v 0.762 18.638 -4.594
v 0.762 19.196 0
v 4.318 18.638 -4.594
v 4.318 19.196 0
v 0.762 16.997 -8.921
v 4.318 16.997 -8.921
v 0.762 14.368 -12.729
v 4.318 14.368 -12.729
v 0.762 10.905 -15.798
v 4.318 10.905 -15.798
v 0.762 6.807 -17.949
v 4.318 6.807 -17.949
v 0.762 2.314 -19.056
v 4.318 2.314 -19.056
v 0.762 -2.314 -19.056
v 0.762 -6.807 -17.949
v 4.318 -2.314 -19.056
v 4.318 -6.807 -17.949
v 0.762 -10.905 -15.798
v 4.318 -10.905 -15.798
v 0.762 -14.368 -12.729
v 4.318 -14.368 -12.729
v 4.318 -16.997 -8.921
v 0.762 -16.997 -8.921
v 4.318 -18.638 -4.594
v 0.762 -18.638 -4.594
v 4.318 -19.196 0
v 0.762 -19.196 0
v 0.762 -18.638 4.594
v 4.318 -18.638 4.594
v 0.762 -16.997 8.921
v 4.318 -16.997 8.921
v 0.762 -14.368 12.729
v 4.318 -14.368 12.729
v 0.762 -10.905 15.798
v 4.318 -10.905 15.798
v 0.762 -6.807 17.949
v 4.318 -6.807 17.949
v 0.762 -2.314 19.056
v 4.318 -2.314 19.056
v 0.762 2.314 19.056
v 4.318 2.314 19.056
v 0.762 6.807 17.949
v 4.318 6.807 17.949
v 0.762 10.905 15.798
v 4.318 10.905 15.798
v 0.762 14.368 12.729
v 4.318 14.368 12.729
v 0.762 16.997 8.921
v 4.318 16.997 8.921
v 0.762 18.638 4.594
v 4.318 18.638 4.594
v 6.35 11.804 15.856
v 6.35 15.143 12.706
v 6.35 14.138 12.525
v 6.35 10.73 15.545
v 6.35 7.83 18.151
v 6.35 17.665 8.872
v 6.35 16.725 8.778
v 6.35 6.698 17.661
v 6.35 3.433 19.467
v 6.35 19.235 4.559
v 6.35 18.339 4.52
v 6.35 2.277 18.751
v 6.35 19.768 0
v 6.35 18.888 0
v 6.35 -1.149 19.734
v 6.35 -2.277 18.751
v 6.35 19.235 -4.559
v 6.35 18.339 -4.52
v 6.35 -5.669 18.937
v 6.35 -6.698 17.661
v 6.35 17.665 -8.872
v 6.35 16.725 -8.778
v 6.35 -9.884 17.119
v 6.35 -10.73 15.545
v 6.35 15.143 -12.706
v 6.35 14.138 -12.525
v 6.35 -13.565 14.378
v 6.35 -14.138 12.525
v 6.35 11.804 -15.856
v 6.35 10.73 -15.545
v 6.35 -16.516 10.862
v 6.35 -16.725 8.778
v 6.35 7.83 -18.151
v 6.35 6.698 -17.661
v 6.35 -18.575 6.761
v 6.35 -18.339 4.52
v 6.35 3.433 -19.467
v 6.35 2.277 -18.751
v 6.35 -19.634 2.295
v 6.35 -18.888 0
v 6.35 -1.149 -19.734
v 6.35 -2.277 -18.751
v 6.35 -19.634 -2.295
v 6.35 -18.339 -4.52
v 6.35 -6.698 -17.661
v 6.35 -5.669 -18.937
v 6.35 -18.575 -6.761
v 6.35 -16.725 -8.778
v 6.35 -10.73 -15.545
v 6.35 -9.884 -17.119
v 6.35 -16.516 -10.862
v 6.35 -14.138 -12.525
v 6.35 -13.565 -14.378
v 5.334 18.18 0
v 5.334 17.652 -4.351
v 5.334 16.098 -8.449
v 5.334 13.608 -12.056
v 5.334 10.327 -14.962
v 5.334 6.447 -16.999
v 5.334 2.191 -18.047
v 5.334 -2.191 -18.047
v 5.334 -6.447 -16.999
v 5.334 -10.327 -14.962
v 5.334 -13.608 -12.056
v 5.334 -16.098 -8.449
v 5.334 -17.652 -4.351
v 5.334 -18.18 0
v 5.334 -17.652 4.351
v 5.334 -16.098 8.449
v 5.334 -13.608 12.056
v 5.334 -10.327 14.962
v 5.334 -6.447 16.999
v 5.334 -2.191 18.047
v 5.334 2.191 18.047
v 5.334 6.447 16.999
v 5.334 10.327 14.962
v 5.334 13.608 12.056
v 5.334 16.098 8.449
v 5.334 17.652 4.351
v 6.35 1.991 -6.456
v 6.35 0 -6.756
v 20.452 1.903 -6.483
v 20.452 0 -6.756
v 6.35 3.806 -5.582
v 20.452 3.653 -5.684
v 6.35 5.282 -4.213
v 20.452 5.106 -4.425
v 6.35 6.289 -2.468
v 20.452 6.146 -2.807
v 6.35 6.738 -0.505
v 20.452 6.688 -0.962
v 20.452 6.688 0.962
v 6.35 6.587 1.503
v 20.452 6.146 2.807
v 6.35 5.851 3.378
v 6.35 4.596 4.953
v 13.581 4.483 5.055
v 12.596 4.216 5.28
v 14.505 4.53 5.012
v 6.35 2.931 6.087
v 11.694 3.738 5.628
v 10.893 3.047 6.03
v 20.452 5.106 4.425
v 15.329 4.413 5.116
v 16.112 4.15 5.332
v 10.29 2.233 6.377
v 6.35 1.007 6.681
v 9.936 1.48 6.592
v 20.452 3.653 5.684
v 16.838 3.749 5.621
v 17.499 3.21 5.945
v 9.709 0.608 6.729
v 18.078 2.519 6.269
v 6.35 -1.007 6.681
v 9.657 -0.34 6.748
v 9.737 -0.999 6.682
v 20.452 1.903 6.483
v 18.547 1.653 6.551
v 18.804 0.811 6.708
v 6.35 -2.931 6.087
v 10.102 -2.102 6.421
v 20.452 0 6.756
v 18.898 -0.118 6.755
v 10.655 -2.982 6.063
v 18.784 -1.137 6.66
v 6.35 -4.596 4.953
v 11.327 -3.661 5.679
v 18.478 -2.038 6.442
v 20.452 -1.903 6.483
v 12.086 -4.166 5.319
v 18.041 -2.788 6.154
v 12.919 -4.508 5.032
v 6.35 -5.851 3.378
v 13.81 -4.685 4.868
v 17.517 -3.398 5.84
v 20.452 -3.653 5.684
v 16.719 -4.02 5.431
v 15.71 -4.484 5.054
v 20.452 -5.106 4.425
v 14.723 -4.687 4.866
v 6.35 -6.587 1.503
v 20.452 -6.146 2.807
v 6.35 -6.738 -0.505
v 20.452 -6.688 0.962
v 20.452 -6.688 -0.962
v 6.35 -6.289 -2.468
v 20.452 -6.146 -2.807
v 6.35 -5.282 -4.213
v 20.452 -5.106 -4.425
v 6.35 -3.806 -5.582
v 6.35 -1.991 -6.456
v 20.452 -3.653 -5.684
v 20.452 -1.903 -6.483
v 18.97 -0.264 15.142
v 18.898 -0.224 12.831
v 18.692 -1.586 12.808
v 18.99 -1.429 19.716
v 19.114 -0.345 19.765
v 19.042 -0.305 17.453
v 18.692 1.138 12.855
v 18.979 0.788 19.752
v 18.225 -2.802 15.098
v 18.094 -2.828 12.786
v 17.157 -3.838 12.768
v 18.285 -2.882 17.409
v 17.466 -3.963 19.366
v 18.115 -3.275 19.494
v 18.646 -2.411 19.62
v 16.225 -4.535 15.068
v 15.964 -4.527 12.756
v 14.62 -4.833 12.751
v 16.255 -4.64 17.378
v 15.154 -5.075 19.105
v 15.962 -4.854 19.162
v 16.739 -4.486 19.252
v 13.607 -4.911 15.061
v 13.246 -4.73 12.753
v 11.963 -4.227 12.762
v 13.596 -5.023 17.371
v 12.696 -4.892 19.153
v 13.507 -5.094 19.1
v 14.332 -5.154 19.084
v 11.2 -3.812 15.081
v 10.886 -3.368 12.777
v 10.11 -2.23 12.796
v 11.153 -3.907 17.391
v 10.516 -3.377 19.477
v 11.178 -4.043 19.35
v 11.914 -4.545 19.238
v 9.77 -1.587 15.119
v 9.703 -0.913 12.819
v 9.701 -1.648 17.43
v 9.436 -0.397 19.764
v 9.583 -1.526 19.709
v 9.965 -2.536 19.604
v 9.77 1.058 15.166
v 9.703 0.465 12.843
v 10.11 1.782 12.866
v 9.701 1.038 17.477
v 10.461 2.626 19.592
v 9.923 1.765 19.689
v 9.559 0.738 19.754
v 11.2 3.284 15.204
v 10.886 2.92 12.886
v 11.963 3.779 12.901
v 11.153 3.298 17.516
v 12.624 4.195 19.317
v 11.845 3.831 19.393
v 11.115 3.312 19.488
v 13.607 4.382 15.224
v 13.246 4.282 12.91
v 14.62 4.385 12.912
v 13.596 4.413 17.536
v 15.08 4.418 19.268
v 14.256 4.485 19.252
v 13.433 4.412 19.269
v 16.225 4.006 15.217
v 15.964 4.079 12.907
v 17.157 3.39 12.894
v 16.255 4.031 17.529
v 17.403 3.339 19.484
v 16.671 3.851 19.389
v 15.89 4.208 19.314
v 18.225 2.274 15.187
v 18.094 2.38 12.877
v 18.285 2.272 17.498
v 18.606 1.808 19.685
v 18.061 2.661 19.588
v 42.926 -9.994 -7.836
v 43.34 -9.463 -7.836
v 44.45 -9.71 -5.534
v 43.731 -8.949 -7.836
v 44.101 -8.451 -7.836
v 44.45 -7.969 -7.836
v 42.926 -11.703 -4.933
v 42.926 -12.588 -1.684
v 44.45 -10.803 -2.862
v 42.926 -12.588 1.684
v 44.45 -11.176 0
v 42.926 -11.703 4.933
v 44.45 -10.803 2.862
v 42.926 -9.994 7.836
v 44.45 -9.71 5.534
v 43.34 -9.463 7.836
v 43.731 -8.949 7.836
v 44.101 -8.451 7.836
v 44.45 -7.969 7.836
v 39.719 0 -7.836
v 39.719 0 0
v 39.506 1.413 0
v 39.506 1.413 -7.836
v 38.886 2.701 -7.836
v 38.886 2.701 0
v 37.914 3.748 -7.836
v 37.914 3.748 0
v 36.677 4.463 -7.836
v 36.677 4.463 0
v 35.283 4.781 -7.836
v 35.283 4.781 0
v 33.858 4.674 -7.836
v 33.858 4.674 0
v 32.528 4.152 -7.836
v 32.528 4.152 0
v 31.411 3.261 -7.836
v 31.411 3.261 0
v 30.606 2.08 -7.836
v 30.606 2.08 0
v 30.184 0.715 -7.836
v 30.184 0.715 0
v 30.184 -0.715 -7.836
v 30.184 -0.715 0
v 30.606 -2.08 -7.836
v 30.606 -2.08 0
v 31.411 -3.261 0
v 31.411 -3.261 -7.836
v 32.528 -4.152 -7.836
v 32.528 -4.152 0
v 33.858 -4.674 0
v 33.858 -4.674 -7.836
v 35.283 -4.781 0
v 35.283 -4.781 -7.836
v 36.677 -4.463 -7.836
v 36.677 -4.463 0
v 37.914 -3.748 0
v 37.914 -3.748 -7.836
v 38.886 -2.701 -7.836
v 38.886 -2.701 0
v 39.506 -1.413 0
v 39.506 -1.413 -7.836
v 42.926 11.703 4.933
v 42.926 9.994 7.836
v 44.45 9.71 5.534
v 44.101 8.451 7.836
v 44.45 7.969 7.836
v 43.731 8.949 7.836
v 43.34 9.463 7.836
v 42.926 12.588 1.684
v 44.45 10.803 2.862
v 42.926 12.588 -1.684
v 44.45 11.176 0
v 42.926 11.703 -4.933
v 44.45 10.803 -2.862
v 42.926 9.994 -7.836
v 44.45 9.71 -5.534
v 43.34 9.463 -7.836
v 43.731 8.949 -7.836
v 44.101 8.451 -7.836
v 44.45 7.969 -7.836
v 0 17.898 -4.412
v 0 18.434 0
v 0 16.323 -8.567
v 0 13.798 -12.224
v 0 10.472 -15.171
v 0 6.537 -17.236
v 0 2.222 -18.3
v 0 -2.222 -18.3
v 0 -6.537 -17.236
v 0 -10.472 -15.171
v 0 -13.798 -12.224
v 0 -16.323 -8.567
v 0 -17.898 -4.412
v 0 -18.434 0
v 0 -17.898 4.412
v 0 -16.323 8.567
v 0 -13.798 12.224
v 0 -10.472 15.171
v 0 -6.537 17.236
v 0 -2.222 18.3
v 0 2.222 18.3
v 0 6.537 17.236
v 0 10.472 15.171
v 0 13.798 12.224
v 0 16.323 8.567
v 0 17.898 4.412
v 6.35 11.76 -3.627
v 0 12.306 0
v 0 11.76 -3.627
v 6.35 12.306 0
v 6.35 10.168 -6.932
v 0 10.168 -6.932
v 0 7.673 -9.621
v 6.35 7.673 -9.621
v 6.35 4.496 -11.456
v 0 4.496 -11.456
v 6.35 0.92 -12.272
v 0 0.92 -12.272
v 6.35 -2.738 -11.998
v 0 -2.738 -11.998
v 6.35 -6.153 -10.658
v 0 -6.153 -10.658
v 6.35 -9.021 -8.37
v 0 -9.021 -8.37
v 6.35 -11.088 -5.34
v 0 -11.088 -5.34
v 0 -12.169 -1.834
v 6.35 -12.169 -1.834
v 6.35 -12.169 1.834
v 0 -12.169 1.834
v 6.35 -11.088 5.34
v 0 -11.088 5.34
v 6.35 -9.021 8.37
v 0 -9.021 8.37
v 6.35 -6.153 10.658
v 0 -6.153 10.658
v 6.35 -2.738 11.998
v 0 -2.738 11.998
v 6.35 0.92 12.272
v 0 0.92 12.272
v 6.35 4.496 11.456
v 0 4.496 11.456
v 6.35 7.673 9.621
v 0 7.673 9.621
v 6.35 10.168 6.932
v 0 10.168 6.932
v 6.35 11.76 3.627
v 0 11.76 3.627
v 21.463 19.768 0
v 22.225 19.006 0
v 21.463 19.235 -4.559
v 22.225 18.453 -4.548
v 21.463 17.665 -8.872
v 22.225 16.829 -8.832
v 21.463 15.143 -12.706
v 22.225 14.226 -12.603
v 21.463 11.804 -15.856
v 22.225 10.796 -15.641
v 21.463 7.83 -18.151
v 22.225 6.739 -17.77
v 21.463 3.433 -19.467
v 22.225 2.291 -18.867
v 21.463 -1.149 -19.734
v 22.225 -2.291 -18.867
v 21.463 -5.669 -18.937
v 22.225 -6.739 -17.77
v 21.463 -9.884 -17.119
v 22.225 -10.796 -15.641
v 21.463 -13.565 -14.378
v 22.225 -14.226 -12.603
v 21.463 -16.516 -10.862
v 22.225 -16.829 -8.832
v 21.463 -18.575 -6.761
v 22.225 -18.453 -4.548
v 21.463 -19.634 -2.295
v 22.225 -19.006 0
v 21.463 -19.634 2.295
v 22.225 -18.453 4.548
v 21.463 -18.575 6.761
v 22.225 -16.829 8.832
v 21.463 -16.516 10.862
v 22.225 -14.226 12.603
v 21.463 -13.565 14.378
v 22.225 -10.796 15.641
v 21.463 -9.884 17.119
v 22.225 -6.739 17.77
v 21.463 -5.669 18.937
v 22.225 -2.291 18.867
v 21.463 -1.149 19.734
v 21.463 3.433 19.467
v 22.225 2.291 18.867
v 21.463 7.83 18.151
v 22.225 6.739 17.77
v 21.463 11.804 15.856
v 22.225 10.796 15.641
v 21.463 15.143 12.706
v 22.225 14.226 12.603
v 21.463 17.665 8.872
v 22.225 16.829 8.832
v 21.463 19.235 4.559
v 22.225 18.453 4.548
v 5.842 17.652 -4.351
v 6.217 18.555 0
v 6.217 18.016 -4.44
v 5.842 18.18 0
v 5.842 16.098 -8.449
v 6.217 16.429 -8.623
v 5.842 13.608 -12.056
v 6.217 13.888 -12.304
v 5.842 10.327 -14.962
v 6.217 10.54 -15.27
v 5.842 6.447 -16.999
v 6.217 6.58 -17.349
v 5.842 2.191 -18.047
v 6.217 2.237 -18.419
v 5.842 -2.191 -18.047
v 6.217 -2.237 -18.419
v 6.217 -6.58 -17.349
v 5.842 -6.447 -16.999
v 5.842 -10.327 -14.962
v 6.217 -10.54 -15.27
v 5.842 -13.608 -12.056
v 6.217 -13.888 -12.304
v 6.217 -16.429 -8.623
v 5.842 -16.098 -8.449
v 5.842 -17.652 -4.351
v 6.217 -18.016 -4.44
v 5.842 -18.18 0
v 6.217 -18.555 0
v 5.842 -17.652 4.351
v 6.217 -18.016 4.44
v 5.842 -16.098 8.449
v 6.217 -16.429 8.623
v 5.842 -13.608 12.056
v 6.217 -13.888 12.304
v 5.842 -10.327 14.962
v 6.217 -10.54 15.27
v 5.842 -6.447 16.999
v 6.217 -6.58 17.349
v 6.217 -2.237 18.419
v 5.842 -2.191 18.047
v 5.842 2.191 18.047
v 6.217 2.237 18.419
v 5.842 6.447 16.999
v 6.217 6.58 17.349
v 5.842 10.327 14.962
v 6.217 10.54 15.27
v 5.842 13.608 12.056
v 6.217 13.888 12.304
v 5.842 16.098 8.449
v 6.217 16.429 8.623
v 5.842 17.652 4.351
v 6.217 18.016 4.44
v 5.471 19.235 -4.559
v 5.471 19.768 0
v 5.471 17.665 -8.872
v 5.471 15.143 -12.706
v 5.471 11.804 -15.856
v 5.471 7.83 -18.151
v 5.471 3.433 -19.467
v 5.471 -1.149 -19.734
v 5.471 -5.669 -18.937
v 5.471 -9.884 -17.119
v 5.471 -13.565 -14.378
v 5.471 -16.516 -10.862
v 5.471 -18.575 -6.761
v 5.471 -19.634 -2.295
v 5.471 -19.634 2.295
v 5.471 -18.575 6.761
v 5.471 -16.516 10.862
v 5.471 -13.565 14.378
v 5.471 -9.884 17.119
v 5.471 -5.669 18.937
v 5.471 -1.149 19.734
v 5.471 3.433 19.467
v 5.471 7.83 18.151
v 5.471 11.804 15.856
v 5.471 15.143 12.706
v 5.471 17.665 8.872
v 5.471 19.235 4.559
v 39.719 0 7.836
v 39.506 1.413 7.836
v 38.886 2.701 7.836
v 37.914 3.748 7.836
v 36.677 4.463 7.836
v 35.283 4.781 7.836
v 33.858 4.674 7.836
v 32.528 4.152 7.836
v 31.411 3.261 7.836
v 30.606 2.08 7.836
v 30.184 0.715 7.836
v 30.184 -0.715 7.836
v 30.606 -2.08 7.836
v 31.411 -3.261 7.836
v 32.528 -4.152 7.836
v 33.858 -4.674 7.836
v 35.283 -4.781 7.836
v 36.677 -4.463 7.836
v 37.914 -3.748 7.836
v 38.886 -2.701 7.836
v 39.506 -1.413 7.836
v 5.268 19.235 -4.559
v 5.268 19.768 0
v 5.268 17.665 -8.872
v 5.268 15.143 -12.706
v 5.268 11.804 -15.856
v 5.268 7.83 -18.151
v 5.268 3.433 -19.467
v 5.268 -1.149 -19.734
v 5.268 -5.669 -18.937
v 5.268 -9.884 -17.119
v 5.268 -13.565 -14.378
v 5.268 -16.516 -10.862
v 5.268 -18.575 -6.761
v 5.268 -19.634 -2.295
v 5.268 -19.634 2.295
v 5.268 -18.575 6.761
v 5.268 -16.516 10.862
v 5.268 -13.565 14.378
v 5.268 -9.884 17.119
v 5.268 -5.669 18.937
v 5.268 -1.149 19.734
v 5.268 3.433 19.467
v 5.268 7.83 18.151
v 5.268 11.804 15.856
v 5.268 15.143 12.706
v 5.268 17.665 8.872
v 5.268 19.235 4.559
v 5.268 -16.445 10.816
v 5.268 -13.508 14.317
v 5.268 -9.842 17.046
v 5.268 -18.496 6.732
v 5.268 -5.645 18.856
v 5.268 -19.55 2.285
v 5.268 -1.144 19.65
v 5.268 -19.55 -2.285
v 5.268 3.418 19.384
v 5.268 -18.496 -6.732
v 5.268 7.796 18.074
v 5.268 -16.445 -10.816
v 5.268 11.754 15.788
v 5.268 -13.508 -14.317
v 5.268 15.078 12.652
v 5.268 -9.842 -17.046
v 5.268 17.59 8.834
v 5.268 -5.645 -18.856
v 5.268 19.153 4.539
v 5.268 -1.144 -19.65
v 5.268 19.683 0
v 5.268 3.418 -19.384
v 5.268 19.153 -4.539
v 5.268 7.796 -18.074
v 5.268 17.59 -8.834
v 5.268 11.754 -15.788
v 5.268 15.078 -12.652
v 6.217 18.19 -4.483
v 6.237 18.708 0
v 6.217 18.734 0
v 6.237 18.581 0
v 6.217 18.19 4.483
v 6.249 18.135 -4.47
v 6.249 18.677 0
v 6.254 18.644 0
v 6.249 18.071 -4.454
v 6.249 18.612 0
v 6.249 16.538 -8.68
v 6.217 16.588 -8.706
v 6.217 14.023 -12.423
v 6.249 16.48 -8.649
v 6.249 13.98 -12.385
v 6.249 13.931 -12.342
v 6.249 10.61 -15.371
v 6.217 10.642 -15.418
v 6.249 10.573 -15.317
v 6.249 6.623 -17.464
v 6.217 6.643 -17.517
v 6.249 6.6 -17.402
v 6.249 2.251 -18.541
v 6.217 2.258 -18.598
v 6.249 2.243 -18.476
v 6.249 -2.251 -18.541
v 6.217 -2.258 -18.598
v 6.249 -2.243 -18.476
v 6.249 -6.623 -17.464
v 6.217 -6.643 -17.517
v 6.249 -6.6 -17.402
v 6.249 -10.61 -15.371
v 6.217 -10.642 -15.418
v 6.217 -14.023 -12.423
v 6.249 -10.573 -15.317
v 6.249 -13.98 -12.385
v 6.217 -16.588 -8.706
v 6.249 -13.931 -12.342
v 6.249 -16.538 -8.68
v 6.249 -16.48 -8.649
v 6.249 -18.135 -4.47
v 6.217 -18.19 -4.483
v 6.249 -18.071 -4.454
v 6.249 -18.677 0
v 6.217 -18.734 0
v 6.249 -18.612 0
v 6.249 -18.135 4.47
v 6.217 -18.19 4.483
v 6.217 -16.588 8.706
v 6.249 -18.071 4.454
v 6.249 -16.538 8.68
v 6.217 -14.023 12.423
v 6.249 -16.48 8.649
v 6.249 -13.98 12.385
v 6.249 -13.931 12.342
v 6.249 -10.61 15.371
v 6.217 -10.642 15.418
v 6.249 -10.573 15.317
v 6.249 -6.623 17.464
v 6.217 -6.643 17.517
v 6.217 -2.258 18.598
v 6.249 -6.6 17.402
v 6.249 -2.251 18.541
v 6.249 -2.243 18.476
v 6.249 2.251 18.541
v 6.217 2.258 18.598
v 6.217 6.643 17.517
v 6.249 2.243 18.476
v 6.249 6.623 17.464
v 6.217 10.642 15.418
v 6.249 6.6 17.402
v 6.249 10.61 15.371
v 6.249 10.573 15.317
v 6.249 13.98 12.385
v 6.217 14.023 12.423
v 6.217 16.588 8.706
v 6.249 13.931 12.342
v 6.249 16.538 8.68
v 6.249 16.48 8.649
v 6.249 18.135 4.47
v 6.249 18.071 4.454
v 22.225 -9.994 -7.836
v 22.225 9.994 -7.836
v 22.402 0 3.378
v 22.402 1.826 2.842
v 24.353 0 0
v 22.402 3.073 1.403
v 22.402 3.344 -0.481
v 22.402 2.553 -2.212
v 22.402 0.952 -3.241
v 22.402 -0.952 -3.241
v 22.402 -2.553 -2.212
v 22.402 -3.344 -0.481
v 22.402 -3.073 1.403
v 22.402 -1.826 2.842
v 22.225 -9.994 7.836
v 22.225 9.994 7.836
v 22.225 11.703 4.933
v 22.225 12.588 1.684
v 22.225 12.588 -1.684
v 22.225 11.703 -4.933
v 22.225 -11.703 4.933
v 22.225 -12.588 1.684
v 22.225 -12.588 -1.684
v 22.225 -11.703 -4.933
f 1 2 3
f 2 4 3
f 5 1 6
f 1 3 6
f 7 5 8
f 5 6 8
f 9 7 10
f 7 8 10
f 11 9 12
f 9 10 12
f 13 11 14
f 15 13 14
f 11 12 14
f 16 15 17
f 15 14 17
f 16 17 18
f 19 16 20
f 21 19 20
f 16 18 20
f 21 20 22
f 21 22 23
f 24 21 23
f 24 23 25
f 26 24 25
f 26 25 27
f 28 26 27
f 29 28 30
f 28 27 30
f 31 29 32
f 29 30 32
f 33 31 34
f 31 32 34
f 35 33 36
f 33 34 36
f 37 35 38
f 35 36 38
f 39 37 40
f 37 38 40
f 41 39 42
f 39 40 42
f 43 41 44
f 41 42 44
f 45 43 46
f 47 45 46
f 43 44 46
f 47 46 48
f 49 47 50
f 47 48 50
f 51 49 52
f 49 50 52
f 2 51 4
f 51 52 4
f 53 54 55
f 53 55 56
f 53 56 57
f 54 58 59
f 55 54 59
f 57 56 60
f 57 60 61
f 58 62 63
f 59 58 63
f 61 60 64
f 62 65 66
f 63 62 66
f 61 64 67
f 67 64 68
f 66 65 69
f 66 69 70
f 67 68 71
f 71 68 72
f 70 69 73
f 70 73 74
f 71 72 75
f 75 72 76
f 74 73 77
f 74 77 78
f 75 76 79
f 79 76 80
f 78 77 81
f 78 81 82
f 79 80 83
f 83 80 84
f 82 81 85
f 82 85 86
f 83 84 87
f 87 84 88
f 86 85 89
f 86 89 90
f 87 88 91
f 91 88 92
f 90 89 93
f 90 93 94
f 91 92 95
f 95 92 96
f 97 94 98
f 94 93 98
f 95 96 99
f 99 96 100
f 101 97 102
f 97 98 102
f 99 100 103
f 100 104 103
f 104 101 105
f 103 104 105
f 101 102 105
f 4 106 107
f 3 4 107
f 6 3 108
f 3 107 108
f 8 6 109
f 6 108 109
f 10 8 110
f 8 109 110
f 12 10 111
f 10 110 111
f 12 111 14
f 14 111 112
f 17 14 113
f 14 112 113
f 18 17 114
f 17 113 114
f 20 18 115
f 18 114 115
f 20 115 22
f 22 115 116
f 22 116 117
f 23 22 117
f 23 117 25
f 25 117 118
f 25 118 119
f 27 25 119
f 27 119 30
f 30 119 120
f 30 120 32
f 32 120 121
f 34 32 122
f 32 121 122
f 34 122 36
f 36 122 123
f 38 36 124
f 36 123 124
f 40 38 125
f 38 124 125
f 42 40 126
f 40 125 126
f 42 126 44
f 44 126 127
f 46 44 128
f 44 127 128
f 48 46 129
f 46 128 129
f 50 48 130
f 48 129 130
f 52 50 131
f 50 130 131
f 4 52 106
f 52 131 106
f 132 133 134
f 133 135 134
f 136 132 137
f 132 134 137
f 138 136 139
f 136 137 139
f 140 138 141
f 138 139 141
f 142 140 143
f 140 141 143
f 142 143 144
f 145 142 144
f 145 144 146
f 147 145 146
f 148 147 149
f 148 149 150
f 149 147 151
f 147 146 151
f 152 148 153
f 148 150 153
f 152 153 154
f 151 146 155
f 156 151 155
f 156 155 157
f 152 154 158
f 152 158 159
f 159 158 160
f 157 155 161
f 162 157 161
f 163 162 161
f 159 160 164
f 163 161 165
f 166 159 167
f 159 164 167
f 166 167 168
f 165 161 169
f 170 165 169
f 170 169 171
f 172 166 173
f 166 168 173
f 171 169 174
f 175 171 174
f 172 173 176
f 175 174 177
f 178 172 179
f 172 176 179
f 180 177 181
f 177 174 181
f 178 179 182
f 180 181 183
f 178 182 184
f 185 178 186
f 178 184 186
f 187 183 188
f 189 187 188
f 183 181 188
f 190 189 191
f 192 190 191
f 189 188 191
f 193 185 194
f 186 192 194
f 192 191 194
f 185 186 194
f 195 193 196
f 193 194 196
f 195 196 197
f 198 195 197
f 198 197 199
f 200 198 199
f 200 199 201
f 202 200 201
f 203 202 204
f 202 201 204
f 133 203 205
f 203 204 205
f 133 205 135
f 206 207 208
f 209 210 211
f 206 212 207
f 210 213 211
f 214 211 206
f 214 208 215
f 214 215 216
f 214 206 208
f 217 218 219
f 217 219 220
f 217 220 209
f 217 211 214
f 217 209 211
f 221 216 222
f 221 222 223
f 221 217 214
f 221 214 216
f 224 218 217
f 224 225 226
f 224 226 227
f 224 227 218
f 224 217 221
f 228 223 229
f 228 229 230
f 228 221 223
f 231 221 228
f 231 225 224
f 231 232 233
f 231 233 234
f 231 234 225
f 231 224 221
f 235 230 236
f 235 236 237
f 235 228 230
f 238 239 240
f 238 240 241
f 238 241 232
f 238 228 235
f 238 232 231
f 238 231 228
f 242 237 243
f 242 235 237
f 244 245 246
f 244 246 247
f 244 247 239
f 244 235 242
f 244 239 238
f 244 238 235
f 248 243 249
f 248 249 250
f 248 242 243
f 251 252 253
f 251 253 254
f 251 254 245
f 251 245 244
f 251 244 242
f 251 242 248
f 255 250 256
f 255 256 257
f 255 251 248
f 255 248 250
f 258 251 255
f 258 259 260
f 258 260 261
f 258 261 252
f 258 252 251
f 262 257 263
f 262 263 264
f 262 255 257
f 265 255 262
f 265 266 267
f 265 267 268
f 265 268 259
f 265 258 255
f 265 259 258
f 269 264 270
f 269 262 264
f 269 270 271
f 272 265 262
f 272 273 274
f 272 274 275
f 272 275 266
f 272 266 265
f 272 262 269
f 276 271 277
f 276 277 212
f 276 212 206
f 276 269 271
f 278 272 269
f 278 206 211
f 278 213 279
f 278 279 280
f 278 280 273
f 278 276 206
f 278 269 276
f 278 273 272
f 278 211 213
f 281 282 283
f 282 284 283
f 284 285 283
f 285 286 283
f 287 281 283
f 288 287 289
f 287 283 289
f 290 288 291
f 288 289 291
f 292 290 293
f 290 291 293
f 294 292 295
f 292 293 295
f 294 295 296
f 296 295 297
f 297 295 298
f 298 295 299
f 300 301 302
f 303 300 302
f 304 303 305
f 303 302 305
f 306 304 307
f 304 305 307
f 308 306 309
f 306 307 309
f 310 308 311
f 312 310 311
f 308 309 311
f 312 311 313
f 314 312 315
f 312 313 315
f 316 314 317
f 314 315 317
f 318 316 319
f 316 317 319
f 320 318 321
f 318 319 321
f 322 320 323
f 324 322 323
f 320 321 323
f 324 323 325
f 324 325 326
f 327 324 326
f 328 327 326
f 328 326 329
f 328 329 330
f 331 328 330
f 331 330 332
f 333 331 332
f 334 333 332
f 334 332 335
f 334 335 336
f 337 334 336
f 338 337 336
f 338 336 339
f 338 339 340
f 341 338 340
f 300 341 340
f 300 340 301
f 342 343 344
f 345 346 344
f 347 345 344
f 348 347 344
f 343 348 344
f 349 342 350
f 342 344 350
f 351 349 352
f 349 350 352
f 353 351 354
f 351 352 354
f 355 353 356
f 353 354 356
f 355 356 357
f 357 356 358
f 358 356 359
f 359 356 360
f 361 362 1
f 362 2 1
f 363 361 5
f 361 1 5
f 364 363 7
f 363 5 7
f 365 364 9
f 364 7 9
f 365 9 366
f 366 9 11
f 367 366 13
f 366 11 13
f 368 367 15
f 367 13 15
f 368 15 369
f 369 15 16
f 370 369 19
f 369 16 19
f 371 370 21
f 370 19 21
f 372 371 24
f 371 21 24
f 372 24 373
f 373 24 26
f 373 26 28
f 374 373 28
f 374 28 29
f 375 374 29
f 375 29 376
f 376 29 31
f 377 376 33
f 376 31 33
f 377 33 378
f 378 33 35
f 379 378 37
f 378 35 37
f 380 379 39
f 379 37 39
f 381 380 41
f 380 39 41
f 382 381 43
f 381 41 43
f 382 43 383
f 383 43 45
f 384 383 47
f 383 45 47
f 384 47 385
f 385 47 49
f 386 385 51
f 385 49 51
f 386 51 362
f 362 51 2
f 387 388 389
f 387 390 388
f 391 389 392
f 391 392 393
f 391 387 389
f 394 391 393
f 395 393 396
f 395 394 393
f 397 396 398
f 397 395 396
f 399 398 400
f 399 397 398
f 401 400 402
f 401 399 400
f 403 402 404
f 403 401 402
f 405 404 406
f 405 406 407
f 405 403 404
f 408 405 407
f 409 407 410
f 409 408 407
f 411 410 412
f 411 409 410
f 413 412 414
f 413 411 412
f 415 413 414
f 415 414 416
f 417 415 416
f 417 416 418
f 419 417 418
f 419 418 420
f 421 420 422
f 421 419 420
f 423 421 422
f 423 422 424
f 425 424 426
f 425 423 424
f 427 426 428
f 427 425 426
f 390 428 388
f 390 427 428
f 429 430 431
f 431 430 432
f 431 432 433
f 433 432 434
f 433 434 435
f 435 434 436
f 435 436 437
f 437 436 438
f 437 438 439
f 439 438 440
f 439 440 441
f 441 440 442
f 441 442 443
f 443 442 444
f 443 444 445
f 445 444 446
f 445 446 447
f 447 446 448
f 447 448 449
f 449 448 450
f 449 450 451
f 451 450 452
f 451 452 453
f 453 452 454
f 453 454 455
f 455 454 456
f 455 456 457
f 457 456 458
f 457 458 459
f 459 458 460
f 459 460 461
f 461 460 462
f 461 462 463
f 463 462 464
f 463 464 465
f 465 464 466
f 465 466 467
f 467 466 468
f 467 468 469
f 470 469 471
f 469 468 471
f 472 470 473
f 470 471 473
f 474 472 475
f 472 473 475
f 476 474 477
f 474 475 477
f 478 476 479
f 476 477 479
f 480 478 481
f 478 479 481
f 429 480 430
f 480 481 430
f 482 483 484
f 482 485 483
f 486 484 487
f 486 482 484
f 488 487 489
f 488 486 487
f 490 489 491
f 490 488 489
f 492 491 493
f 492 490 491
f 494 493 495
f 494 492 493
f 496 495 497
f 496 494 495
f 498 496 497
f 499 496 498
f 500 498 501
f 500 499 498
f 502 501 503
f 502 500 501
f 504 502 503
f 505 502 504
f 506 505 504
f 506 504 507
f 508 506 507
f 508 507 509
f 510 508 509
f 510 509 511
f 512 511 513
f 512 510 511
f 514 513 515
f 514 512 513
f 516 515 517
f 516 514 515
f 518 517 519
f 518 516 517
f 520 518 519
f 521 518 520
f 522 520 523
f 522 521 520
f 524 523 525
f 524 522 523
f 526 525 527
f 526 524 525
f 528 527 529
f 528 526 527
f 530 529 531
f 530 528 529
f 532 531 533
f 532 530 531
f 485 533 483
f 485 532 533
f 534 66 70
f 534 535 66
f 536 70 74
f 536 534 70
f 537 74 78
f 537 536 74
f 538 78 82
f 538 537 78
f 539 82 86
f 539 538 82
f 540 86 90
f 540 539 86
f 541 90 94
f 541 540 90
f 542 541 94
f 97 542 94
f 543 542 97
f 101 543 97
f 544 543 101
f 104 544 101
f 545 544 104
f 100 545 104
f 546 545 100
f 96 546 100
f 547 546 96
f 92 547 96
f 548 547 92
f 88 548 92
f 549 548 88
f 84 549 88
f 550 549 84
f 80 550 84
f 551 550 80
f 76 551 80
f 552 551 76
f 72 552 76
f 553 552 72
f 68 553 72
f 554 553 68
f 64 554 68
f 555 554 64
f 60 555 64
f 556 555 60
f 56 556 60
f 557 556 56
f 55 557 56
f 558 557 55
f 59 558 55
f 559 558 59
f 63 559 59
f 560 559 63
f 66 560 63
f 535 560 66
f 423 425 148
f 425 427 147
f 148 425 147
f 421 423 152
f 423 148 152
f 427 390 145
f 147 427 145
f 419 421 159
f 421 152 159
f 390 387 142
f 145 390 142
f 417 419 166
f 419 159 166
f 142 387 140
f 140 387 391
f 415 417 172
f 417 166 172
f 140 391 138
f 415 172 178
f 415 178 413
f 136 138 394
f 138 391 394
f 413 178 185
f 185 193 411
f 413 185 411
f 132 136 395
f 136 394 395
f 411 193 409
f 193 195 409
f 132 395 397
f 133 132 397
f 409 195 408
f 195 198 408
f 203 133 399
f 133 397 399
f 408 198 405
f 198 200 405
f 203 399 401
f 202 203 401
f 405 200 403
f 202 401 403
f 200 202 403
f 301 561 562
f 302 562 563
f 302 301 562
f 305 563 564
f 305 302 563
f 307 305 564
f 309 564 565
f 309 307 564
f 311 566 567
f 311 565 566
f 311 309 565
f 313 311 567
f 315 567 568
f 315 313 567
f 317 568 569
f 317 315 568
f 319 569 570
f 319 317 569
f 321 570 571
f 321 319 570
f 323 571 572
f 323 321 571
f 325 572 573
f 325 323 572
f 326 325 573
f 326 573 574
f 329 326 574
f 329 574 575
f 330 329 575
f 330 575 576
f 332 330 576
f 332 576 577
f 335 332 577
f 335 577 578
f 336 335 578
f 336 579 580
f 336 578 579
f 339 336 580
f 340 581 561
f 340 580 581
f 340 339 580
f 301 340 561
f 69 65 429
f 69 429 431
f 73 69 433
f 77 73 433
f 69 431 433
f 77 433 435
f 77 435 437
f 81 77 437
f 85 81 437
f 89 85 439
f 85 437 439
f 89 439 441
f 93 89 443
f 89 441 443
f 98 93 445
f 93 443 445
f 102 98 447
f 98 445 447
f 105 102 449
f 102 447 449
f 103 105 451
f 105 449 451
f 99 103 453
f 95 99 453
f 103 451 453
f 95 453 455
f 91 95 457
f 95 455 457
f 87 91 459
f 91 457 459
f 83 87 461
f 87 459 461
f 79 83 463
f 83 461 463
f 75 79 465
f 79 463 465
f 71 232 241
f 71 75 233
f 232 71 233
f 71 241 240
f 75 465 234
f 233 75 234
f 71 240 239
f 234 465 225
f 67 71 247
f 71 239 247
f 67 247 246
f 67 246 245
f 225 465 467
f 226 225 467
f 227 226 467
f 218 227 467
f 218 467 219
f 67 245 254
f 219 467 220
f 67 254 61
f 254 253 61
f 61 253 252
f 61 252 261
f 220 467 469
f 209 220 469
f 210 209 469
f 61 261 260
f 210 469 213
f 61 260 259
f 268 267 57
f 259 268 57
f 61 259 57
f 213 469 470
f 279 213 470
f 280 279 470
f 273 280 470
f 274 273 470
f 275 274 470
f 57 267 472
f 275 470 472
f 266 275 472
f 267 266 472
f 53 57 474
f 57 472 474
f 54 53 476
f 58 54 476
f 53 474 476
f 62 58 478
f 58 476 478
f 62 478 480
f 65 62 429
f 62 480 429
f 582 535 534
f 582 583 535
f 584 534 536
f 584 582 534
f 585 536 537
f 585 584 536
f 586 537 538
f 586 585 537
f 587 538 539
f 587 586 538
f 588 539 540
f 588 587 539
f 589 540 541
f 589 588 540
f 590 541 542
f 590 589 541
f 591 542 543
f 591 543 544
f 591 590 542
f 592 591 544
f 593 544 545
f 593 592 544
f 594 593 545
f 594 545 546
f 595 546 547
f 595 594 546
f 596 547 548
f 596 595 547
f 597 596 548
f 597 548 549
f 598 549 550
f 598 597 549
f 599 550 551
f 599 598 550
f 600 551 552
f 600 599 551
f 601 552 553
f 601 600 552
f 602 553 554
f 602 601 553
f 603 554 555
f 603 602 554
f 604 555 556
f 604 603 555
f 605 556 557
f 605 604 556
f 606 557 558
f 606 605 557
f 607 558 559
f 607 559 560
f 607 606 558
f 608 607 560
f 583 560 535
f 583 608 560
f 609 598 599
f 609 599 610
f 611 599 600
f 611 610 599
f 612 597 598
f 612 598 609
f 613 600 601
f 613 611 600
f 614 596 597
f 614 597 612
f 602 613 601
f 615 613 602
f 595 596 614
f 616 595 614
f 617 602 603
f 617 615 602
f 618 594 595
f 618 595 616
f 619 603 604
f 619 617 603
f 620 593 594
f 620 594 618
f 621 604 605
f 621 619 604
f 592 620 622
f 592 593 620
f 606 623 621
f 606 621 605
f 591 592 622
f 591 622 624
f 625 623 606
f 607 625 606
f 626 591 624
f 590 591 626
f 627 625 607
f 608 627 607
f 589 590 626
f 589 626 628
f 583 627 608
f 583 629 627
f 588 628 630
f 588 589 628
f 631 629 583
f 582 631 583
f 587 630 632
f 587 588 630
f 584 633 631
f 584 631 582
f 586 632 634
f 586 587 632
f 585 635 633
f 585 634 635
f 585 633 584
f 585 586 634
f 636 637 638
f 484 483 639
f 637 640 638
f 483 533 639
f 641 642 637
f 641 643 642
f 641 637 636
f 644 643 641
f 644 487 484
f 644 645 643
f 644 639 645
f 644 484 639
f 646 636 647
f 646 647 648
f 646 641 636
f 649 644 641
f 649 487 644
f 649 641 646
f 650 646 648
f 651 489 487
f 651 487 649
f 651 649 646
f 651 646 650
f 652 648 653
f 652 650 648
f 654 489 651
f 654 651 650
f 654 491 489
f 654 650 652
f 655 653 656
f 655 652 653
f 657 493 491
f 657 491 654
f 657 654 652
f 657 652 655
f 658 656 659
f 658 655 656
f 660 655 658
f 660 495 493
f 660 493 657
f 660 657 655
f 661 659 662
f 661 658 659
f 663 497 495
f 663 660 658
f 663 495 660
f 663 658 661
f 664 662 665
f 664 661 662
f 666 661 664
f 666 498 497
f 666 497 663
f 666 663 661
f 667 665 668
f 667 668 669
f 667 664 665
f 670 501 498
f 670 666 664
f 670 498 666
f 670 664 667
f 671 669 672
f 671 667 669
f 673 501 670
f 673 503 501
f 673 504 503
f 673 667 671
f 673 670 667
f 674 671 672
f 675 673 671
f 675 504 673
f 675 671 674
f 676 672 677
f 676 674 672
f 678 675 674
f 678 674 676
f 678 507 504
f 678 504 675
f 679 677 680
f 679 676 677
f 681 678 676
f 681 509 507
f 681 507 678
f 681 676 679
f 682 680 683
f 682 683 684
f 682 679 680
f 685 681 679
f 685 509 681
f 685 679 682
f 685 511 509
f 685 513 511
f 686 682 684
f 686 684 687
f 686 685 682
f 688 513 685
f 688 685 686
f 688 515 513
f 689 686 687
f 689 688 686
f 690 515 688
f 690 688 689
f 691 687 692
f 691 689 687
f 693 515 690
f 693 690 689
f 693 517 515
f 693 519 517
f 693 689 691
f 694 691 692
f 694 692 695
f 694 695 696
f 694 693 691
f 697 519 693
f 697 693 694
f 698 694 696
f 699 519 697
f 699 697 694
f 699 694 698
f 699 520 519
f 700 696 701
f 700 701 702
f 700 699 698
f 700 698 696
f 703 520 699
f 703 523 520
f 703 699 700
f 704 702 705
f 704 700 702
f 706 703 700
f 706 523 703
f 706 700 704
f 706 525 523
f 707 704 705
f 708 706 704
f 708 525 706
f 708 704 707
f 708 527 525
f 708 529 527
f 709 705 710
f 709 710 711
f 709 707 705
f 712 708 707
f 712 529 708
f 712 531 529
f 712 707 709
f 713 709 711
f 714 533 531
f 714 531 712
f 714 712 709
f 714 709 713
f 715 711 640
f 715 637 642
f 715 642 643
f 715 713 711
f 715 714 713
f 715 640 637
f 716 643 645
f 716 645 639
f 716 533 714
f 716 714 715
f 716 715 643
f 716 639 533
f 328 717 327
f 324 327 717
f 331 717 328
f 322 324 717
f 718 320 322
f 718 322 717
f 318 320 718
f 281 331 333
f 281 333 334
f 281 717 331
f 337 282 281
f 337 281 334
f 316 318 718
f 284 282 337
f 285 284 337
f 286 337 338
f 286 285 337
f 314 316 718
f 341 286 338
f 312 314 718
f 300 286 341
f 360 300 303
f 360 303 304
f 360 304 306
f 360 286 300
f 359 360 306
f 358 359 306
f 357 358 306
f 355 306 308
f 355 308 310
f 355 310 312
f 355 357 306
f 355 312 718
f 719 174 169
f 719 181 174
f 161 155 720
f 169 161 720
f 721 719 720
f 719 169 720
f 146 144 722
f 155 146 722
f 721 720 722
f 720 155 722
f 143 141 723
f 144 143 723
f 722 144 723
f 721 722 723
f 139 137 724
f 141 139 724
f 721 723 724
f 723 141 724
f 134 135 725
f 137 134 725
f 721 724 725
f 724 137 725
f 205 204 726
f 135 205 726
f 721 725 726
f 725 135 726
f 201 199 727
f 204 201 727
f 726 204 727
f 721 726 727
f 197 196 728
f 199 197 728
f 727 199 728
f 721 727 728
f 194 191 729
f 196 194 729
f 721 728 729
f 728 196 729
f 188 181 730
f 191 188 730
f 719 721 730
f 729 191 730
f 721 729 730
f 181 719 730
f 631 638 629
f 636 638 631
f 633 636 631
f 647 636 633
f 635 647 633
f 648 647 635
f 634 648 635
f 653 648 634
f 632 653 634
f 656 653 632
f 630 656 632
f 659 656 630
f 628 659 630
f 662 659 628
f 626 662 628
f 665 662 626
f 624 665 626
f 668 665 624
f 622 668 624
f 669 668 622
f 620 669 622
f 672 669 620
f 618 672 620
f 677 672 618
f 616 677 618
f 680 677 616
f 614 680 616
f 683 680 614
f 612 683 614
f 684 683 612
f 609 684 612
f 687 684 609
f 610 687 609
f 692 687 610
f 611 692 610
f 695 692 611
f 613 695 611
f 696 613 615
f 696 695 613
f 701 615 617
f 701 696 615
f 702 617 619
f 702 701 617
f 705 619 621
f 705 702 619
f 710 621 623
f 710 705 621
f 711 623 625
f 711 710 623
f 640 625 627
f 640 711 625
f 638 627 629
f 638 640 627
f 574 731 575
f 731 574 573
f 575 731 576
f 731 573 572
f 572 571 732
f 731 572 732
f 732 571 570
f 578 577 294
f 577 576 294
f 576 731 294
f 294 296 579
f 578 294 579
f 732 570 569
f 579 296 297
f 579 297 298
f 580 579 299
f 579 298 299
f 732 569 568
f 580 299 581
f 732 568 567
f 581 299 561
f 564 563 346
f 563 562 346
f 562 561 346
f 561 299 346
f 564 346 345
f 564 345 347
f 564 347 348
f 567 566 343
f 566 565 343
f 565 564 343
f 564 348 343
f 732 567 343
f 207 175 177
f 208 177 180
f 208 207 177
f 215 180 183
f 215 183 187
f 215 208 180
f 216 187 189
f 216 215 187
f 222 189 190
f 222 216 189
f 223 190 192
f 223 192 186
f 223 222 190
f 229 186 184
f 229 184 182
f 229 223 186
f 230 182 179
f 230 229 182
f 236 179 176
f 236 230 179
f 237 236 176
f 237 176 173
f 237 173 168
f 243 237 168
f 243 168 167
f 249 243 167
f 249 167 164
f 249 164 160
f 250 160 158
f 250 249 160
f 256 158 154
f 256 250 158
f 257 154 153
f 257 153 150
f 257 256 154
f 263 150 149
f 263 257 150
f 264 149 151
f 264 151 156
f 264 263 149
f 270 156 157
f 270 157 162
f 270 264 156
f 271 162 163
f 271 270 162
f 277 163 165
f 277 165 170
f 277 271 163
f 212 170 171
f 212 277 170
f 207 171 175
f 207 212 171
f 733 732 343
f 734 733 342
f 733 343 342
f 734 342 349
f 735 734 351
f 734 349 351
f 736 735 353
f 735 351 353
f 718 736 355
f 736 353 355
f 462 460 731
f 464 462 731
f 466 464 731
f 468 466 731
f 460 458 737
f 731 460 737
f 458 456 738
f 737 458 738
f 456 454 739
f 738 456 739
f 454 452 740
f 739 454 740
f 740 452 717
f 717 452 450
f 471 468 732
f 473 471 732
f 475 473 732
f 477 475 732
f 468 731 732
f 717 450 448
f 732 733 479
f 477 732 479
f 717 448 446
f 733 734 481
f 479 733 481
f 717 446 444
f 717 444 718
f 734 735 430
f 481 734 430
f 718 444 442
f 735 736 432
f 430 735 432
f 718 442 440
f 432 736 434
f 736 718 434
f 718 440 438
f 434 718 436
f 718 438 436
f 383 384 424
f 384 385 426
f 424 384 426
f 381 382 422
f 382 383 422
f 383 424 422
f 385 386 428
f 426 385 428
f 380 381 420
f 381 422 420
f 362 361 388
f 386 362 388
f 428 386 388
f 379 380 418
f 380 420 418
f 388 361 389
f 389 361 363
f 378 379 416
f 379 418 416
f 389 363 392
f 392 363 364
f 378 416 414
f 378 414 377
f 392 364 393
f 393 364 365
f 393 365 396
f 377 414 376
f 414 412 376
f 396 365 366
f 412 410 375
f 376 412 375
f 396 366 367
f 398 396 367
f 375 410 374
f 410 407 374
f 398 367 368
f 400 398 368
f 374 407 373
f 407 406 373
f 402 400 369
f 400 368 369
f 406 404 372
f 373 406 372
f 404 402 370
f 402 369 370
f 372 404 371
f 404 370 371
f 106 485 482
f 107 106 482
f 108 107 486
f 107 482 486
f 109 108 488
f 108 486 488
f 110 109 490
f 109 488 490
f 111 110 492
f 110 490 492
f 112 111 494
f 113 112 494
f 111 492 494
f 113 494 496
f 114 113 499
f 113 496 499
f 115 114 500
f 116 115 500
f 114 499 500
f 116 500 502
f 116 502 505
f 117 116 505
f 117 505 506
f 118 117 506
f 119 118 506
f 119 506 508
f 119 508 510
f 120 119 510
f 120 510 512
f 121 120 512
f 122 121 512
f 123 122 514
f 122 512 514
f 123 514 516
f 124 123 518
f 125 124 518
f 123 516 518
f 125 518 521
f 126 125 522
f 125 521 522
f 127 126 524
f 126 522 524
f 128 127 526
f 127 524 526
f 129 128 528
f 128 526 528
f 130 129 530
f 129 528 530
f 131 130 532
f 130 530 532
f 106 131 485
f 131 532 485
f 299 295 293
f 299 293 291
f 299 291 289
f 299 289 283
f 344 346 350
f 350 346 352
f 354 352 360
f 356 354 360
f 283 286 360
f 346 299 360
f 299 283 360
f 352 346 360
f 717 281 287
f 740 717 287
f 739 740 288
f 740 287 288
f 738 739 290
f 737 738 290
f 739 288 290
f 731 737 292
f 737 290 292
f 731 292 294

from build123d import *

# Parameters (mm, degrees)
SKETCH3_W               = 79.0702
SKETCH3_H               = 158.1404
SKETCH3_W_2             = 15.6718
SKETCH3_H_2             = 79.0702
CUT_EXTRUDE1_DEPTH      = 22.225
HOLE1_D                 = 13.5128
HOLE1_DEPTH             = 20.45208
HOLE1_TIP               = 3.900809359
SKETCH7_W               = 6.35
SKETCH7_H               = 12.3063
SKETCH9_R               = 4.79425
CUT_EXTRUDE2_DEPTH      = 11.75385
CUT_EXTRUDE2_DEPTH_BACK = 11.75385


with BuildPart() as part:
    # Sketch1 → Revolve1 (revolve)
    with BuildSketch(Plane.XY):
        Polygon((0, 0), (0, 18.43405), (0.762, 19.19605), (4.318, 19.19605), (5.334, 18.18005), (6.35, 18.18005), (6.35, 19.76755), (21.463, 19.76755), (22.225, 19.00555), (22.225, 0), align=None)
    revolve(axis=Axis((22.225, 0, 0), (-1, 0, 0)))

    # Sketch2 → Revolve2 (revolve)
    with BuildSketch(Plane.XY):
        Polygon((22.225, 0), (22.225, 12.7), (42.926, 12.7), (44.45, 11.176), (44.45, 0), align=None)
    revolve(axis=Axis((44.45, 0, 0), (-1, 0, 0)))

    # Sketch3 → Cut-Extrude1 (cut)
    with BuildSketch(Plane(origin=(44.45, 0, 0), x_dir=(0, 0, -1), z_dir=(1, 0, 0))):
        Rectangle(SKETCH3_W, SKETCH3_H)
        Rectangle(SKETCH3_W_2, SKETCH3_H_2, mode=Mode.SUBTRACT)
    extrude(amount=-CUT_EXTRUDE1_DEPTH, mode=Mode.SUBTRACT)

    # Hole1
    with Locations(Plane.ZY):
        with Locations((0, 0)):
            Hole(HOLE1_D / 2, depth=HOLE1_DEPTH)
            with Locations((0, 0, -(HOLE1_DEPTH + HOLE1_TIP / 2))):  # 120° drill point
                Cone(0, HOLE1_D / 2, HOLE1_TIP, mode=Mode.SUBTRACT)

    # Sketch6 → Cut-Revolve1 (revolve, cut)
    with BuildSketch(Plane(origin=(0, 0, 0), x_dir=(-1, 0, 0), z_dir=(0, 0.999847695, 0.017452406))):
        Polygon((-14.2748, 0), (-18.897793378, 0), (-18.897793378, 12.83335), (-19.114275925, 19.76755), (-14.2748, 19.76755), align=None)
    revolve(axis=Axis((14.2748, -0.344991317, 19.764539306), (0, 0.017452406, -0.999847695)), mode=Mode.SUBTRACT)

    # Sketch7 → Cut-Revolve2 (revolve, cut)
    with BuildSketch(Plane.XY):
        with Locations((3.175, 6.15315)):
            Rectangle(SKETCH7_W, SKETCH7_H)
    revolve(axis=Axis((6.35, 0, 0), (-1, 0, 0)), mode=Mode.SUBTRACT)

    # Sketch8 → Revolve3 (revolve)
    with BuildSketch(Plane.XY):
        with BuildLine():
            Line((5.267509175, 19.683381804), (6.216617928, 18.734273051))
            ThreePointArc((6.216617928, 18.734273051), (6.253815367, 18.64447049), (6.216617928, 18.554667928))
            Line((6.216617928, 18.554667928), (5.842, 18.18005))
            Line((5.842, 18.18005), (5.334, 18.18005))
            Line((5.334, 18.18005), (5.334, 17.92605))
            Line((5.334, 17.92605), (6.35, 17.92605))
            Line((6.35, 17.92605), (6.35, 18.888259175))
            Line((6.35, 18.888259175), (5.470709175, 19.76755))
            Line((5.470709175, 19.76755), (5.267509175, 19.76755))
            Line((5.267509175, 19.76755), (5.267509175, 19.683381804))
        make_face()
    revolve(axis=Axis((6.35, 0, 0), (-1, 0, 0)))

    # Sketch9 → Cut-Extrude2 (cut, two sides)
    with BuildSketch(Plane.XY) as cut_extrude2_sk:
        with Locations((34.925, 0)):
            Circle(SKETCH9_R)
    extrude(amount=CUT_EXTRUDE2_DEPTH, mode=Mode.SUBTRACT)
    extrude(cut_extrude2_sk.sketch, amount=-CUT_EXTRUDE2_DEPTH_BACK, mode=Mode.SUBTRACT)


solid = part.part
